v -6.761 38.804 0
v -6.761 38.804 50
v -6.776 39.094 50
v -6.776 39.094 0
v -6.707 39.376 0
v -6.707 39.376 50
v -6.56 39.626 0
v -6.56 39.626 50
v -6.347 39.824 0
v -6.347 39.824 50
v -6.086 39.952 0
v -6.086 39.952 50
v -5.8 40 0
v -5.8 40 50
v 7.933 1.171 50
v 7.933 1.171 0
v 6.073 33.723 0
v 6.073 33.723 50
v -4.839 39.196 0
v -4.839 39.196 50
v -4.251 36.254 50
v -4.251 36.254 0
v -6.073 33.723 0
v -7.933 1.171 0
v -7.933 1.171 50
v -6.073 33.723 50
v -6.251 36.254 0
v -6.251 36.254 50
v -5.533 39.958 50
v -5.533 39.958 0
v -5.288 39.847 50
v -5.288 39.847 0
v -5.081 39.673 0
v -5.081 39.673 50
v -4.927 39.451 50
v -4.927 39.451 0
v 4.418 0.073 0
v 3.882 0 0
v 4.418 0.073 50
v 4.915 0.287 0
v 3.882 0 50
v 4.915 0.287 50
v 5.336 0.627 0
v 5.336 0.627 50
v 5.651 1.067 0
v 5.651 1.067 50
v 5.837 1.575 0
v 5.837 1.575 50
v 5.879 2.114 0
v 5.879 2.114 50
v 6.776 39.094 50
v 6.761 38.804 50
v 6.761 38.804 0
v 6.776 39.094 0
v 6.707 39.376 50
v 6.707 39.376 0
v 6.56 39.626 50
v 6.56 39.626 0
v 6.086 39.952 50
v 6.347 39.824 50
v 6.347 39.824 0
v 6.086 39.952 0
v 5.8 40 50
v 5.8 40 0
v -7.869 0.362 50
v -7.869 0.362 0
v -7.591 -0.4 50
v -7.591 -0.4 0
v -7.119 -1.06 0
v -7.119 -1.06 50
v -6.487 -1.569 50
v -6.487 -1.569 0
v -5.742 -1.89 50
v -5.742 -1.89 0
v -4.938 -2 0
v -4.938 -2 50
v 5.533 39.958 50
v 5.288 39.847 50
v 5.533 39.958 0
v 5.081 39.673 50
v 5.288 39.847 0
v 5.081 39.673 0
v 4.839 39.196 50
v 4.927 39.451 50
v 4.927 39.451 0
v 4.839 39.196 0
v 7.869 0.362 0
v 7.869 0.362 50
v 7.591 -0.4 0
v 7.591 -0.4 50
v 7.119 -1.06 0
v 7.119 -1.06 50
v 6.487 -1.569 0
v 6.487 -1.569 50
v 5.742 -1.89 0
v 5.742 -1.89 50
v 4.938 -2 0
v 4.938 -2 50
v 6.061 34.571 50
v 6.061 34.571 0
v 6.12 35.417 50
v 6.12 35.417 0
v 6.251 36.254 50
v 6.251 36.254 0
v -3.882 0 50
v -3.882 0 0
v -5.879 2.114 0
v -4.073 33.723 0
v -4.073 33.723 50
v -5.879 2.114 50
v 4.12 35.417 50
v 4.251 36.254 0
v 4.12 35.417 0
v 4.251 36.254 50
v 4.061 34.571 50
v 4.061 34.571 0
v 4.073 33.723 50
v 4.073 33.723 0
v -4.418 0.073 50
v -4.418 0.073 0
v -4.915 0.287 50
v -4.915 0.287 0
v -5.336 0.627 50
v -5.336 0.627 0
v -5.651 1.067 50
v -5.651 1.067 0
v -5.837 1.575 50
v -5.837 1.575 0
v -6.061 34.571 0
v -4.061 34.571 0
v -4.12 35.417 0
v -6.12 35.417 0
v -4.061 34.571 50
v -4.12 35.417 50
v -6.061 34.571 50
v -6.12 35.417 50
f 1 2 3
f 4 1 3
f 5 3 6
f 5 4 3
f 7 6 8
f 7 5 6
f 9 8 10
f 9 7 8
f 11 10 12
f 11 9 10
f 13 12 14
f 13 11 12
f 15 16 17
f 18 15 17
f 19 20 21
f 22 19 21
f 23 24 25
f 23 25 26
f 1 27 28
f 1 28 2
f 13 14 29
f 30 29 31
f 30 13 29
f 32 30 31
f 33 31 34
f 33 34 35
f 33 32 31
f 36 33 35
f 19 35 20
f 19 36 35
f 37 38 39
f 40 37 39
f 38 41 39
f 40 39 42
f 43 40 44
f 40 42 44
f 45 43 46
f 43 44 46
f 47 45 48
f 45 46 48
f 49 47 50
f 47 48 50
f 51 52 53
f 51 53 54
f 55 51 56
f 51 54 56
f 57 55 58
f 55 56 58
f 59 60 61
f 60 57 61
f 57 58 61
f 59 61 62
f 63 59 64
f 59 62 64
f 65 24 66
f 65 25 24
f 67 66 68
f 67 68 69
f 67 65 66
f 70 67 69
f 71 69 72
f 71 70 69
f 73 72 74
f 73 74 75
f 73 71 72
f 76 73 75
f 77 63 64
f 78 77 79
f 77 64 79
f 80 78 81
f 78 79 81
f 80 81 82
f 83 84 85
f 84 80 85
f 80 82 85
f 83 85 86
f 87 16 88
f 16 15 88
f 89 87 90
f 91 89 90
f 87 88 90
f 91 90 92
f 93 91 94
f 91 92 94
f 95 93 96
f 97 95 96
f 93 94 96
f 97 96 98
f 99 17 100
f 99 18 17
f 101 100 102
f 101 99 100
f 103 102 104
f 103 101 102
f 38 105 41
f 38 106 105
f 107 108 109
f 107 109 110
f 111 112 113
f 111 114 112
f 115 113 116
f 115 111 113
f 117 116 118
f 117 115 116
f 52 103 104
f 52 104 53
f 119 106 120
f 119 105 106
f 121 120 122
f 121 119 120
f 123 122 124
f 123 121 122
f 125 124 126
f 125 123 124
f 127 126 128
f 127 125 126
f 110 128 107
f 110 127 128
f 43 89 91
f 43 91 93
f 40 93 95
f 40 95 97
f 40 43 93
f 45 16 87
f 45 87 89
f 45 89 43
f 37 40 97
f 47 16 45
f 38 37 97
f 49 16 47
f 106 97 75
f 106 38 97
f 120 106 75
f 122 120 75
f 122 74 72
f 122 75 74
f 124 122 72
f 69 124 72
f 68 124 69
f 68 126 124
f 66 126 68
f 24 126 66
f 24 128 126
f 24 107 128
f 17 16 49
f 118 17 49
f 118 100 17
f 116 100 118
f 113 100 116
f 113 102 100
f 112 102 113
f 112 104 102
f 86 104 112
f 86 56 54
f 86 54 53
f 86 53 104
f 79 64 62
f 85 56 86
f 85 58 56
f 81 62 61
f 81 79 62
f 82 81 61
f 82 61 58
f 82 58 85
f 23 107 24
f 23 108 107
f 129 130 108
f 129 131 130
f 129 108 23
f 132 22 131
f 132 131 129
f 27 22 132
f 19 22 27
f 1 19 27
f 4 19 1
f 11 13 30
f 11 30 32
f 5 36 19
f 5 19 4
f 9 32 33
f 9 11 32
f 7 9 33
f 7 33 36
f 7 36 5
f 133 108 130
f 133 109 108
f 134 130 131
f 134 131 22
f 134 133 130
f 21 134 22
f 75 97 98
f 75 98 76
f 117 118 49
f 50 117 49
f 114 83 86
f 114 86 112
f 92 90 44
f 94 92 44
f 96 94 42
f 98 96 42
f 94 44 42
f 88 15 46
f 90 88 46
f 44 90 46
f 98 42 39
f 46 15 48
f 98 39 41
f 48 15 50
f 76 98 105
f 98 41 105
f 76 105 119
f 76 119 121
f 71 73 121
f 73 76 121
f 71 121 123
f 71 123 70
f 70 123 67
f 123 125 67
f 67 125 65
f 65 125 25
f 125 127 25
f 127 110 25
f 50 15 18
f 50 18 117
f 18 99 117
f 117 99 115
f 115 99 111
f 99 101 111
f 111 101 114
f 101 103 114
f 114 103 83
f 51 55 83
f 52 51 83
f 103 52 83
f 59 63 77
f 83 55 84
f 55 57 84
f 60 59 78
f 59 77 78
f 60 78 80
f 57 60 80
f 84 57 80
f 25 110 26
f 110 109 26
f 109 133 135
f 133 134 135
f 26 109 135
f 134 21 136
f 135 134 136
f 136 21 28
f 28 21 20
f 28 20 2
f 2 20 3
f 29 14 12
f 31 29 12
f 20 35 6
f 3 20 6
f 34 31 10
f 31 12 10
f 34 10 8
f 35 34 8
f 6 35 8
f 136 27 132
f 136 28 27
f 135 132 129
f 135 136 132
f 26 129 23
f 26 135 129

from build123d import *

# Parameters (mm, degrees)
F1_DEPTH    = 50
F3_R        = 2
F4_R        = 3
F5_R        = 2
F6_R        = 3
F7_T1_DEPTH = 54.0990195136
F7_T3_DEPTH = 56.0990195136
F8_R        = 10


# Not quite as in the source:
# - a fillet or chamfer that OpenCascade refuses, or shapes differently, is made with other operations: its cross-section is extruded or revolved along the edge and cut away or added


with BuildPart() as f1:
    # F0 (on Top) → F1 (new body)
    with BuildSketch(Plane.XY):
        Polygon((6, 0), (0, 0), (0, -2), (8.1142857143, -2), (6, 35), (7, 40), (5, 40), (4, 35), align=None)
    extrude(amount=F1_DEPTH)

    # F2: F1 across face


with BuildPart() as f1_1:
    add(f1.part)
    add(f1.part.mirror(Plane(origin=(0, -1, 25), x_dir=(0, -1, 0), z_dir=(-1, 0, 0))))

    # F3
    f3_edges = [f1_1.edges().sort_by_distance(p)[0] for p in [
        (6, 0, 25),
    ]]
    fillet(f3_edges, radius=F3_R)

    # F4
    f4_edges = [f1_1.edges().sort_by_distance(p)[0] for p in [
        (8.114286, -2, 25),
    ]]
    fillet(f4_edges, radius=F4_R)

    # F5
    f5_edges = [f1_1.edges().sort_by_distance(p)[0] for p in [
        (-6, 0, 25),
    ]]
    fillet(f5_edges, radius=F5_R)

    # F6
    f6_edges = [f1_1.edges().sort_by_distance(p)[0] for p in [
        (-8.114286, -2, 25),
    ]]
    fillet(f6_edges, radius=F6_R)

    # F7: fillet of radius 1 on 4 edges, made by hand

    # F7_s2 → F7_t1 (cut)
    with BuildSketch(Plane.XY.offset(-2.0495097568)):
        with BuildLine():
            ThreePointArc((-5.8198039027, 40), (-5.1858149971, 39.7733421413), (-4.839223227, 39.1961161351))
            Line((-4.839223227, 39.1961161351), (-5, 40))
            Line((-5, 40), (-5.8198039027, 40))
        make_face()
        with BuildLine():
            ThreePointArc((5.8198039027, 40), (5.1858149971, 39.7733421413), (4.839223227, 39.1961161351))
            Line((4.839223227, 39.1961161351), (5, 40))
            Line((5, 40), (5.8198039027, 40))
        make_face()
    extrude(amount=F7_T1_DEPTH, mode=Mode.SUBTRACT)

    # F7_s4 → F7_t3 (cut)
    with BuildSketch(Plane.XY.offset(-3.0495097568)):
        with BuildLine():
            ThreePointArc((-6.760776773, 38.8038838649), (-6.5535382386, 39.6339889056), (-5.7801960973, 40))
            Line((-5.7801960973, 40), (-7, 40))
            Line((-7, 40), (-6.760776773, 38.8038838649))
        make_face()
        with BuildLine():
            ThreePointArc((6.760776773, 38.8038838649), (6.5535382386, 39.6339889056), (5.7801960973, 40))
            Line((5.7801960973, 40), (7, 40))
            Line((7, 40), (6.760776773, 38.8038838649))
        make_face()
    extrude(amount=F7_T3_DEPTH, mode=Mode.SUBTRACT)

    # F8
    f8_edges = [f1_1.edges().sort_by_distance(p)[0] for p in [
        (-4, 35, 25),
        (4, 35, 25),
        (6, 35, 25),
        (-6, 35, 25),
    ]]
    fillet(f8_edges, radius=F8_R)


solid = f1_1.part
